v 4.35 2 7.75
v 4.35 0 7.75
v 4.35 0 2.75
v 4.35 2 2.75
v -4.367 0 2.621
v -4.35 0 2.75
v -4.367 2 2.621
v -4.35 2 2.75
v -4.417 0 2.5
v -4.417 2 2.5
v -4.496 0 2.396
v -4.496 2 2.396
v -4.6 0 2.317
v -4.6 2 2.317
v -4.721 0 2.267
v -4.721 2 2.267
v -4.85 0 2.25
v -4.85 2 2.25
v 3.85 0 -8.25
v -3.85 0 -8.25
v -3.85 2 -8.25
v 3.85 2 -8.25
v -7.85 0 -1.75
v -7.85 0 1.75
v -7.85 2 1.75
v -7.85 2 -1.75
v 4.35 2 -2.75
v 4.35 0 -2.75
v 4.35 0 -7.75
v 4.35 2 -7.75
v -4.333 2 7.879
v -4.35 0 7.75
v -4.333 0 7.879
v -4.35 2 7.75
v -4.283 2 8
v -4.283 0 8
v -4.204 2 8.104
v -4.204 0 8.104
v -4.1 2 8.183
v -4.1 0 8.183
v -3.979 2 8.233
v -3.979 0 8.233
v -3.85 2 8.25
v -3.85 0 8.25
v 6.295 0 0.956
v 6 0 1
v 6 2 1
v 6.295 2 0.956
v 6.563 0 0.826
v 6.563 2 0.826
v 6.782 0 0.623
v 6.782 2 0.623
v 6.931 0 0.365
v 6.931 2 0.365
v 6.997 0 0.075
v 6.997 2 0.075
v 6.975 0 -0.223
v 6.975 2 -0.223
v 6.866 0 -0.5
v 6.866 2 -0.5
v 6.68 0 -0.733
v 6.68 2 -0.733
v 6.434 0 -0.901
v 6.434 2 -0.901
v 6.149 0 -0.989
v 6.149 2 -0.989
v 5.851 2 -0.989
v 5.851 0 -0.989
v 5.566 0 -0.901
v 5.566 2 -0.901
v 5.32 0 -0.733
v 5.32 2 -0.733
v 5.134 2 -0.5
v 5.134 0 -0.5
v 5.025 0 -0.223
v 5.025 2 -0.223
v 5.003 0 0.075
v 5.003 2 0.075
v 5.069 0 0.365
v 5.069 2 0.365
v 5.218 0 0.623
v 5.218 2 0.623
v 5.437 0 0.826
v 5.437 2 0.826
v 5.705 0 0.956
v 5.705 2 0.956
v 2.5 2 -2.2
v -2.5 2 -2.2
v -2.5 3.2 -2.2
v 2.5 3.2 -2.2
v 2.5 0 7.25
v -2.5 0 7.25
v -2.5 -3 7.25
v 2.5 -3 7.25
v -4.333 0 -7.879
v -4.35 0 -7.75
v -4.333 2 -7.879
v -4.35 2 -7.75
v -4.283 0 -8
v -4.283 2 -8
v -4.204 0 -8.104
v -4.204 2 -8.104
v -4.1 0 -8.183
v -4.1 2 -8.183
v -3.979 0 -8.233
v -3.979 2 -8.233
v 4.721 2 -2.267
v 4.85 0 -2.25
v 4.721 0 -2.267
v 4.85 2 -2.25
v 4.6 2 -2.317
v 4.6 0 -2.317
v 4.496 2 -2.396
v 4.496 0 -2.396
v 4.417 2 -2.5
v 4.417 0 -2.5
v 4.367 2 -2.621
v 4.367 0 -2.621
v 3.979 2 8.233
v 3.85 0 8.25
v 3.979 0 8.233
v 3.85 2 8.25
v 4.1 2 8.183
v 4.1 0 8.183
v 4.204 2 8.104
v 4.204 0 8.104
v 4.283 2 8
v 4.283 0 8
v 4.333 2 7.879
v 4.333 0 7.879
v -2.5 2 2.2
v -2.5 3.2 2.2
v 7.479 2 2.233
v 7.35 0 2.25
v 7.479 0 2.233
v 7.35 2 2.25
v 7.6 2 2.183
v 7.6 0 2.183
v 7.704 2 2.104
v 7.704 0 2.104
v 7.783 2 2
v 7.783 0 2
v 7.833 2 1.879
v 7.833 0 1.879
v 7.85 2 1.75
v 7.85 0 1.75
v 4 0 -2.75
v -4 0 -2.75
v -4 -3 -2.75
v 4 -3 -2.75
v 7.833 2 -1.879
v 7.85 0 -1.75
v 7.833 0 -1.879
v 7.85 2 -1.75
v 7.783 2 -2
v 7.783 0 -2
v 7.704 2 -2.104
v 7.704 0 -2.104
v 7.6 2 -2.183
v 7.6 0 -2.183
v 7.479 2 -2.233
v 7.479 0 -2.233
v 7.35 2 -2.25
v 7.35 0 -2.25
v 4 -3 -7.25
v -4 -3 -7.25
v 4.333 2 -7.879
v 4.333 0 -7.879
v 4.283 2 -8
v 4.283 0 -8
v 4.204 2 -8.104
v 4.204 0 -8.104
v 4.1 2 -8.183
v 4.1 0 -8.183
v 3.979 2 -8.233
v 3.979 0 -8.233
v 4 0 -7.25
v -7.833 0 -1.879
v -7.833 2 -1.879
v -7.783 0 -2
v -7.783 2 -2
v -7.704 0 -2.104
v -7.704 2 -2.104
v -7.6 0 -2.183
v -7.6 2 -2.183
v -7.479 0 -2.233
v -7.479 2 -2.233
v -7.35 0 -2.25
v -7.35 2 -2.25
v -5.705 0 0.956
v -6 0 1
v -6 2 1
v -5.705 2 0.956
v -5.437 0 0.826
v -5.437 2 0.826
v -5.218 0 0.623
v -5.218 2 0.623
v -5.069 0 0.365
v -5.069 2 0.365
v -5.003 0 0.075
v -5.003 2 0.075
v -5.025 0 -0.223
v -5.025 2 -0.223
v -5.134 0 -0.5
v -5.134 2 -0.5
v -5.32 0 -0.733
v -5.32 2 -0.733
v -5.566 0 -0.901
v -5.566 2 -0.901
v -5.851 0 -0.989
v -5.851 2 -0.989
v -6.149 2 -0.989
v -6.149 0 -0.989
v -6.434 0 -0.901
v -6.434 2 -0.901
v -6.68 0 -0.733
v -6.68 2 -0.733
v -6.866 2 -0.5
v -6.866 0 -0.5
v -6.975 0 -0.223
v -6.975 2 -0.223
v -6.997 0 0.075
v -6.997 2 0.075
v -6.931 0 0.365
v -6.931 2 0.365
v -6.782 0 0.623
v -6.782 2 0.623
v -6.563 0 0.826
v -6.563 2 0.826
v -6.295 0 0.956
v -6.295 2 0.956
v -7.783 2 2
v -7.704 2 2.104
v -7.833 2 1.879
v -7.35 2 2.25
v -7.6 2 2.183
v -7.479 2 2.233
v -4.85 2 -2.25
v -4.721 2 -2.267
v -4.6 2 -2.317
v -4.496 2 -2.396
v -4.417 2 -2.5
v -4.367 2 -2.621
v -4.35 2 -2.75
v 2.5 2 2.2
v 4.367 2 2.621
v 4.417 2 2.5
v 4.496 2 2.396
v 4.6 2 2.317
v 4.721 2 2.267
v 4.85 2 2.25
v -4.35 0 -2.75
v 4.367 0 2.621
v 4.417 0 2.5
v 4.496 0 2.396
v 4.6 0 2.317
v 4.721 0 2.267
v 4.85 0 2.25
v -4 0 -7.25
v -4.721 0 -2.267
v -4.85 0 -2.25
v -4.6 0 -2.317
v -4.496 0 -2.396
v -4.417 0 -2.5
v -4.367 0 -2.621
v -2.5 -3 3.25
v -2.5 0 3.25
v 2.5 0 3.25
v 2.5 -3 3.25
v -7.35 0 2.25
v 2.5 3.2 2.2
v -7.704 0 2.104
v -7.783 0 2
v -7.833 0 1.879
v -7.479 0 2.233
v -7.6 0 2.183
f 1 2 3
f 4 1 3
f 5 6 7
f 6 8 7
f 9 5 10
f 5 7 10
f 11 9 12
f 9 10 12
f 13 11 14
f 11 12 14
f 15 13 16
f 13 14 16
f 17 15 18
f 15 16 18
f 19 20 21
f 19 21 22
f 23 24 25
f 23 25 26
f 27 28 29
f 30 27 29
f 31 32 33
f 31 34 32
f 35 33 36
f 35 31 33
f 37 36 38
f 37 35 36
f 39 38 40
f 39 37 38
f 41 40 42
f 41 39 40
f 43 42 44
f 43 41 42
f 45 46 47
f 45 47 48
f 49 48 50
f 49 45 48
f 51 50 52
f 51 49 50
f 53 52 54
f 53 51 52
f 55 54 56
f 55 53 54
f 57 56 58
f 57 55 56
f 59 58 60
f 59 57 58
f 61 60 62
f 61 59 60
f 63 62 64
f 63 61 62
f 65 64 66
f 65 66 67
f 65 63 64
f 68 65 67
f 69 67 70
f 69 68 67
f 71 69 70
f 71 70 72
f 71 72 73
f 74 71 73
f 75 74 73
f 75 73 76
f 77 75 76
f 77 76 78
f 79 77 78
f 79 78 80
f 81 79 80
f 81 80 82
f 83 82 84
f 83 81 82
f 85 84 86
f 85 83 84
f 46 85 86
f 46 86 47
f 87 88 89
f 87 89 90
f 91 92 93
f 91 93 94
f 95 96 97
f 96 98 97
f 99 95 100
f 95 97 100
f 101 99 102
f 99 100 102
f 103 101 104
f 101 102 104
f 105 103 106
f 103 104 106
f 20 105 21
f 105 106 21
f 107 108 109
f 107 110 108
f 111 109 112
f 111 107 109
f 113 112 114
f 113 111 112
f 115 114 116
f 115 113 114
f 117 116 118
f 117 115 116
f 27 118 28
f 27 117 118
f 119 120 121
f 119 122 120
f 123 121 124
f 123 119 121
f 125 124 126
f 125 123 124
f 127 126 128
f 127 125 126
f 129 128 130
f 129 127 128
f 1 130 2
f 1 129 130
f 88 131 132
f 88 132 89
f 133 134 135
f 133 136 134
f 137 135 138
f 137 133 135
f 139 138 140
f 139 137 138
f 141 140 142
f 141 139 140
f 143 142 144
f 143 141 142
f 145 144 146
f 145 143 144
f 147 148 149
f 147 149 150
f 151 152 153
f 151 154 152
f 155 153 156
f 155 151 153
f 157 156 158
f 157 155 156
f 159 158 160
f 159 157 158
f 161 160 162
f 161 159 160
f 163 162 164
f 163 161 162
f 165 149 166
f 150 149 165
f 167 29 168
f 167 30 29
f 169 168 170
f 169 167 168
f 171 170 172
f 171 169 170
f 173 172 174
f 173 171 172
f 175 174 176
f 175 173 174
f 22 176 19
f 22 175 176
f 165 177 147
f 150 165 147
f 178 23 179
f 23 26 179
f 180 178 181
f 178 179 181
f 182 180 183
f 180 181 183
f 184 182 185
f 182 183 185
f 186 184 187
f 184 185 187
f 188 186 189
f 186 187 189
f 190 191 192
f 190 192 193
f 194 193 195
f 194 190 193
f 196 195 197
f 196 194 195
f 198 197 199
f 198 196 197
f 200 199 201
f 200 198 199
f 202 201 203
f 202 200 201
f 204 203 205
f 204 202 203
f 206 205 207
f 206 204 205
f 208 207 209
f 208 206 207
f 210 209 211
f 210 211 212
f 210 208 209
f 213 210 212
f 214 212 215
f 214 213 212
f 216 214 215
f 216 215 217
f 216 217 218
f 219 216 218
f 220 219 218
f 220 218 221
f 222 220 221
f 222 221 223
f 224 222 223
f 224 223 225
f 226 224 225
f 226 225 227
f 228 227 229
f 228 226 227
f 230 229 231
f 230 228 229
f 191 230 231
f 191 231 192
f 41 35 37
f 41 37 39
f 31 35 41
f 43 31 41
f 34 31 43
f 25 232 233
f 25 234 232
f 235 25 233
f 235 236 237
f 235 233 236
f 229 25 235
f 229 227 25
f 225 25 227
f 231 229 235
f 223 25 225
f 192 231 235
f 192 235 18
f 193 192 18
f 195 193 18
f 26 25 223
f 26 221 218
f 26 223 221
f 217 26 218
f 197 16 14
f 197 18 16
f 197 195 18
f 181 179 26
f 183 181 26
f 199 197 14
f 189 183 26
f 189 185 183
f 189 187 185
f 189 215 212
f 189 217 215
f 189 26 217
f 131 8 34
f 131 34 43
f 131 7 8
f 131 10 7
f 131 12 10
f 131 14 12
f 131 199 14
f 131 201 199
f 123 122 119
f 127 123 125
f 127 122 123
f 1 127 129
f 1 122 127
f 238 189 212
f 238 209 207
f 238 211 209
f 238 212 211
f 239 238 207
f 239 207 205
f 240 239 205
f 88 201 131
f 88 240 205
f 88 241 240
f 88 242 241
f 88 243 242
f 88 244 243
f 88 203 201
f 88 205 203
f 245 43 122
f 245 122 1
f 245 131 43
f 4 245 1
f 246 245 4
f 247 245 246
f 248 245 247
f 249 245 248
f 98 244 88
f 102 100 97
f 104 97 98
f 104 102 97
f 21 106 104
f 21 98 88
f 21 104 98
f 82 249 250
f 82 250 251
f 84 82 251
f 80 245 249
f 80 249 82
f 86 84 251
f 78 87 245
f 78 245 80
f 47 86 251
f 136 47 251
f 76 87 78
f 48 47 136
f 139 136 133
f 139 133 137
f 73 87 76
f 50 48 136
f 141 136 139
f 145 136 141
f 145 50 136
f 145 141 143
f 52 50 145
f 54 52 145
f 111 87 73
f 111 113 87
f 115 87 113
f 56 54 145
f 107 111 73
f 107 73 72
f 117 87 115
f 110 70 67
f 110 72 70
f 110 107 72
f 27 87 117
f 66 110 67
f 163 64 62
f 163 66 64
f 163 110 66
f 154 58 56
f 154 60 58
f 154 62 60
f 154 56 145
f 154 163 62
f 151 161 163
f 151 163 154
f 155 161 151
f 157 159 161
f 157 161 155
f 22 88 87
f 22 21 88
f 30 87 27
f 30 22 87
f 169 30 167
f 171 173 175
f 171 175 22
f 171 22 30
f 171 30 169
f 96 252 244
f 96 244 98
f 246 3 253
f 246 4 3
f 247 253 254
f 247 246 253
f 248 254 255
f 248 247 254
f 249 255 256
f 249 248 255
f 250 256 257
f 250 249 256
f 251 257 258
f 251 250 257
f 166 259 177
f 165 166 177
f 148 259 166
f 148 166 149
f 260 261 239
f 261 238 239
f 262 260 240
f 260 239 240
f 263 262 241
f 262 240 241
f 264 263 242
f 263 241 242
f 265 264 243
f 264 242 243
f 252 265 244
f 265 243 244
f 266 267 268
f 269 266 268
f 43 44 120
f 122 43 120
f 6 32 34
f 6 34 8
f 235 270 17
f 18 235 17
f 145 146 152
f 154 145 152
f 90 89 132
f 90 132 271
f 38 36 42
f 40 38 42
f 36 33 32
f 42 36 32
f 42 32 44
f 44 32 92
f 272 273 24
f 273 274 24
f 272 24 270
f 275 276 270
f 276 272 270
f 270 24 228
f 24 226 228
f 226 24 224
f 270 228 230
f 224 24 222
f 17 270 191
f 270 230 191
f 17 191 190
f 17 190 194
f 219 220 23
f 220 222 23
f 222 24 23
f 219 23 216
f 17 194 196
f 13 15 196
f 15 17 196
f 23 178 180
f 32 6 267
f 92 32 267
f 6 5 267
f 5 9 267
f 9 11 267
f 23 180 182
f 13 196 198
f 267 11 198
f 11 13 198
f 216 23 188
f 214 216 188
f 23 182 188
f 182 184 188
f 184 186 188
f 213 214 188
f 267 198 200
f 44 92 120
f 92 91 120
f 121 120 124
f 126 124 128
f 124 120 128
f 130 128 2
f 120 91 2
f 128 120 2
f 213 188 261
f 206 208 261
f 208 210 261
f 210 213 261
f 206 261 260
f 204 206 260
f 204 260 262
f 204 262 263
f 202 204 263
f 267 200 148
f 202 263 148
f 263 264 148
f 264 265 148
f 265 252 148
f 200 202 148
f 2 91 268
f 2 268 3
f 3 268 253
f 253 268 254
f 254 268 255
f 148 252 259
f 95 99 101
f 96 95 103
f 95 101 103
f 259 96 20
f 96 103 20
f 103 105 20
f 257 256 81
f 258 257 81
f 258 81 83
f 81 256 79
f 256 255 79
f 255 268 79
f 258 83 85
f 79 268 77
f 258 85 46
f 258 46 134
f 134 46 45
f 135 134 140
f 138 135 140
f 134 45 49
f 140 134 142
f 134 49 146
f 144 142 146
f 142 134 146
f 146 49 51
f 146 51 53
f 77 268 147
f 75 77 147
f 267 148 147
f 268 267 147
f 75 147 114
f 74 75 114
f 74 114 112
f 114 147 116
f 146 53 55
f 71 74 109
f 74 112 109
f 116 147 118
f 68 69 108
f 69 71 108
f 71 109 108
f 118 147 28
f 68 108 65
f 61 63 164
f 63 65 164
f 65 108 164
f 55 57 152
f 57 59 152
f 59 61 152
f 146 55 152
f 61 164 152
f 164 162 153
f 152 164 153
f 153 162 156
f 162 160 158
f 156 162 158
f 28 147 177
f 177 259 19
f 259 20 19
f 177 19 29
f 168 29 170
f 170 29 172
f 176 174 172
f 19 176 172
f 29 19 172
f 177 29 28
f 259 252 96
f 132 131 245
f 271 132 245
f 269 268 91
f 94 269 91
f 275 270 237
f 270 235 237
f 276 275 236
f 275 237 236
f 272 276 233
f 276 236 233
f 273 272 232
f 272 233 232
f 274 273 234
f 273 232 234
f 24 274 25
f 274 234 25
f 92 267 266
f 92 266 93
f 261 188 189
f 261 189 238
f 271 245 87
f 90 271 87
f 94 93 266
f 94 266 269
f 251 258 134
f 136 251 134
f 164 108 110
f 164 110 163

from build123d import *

# Parameters (mm, degrees)
SKETCH1_W           = 8.7
SKETCH1_H           = 6
SKETCH1_H_2         = 4.5
SKETCH1_W_2         = 3.5
SKETCH1_R           = 1
BOSS_EXTRUDE1_DEPTH = 2
FILLET1_R           = 0.5
SKETCH2_W           = 8
SKETCH2_H           = 4.5
SKETCH2_W_2         = 5
SKETCH2_H_2         = 4
BOSS_EXTRUDE2_DEPTH = 3
SKETCH3_W           = 5
SKETCH3_H           = 4.4
BOSS_EXTRUDE3_DEPTH = 1.2


with BuildPart() as part:
    # Sketch1 → Boss-Extrude1 (new body)
    # profile 1 of 5: a face of its own
    with BuildSketch(Plane(origin=(0, 0, 0), x_dir=(1, 0, 0), z_dir=(0, 1, 0))):
        with Locations((0, 5.25)):
            Rectangle(SKETCH1_W, SKETCH1_H)
    # profile 2 of 5: a face of its own
    with BuildSketch(Plane(origin=(0, 0, 0), x_dir=(1, 0, 0), z_dir=(0, 1, 0))):
        Rectangle(SKETCH1_W, SKETCH1_H_2)
    # profile 3 of 5: a face of its own
    with BuildSketch(Plane(origin=(0, 0, 0), x_dir=(1, 0, 0), z_dir=(0, 1, 0))):
        with Locations((-6.1, 0)):
            Rectangle(SKETCH1_W_2, SKETCH1_H_2)
        with Locations(Location((-6, 0, 0), (0, 0, 270))):
            Circle(SKETCH1_R, mode=Mode.SUBTRACT)
    # profile 4 of 5: a face of its own
    with BuildSketch(Plane(origin=(0, 0, 0), x_dir=(1, 0, 0), z_dir=(0, 1, 0))):
        with Locations((6.1, 0)):
            Rectangle(SKETCH1_W_2, SKETCH1_H_2)
        with Locations(Location((6, 0, 0), (0, 0, 270))):
            Circle(SKETCH1_R, mode=Mode.SUBTRACT)
    # profile 5 of 5: a face of its own
    with BuildSketch(Plane(origin=(0, 0, 0), x_dir=(1, 0, 0), z_dir=(0, 1, 0))):
        with Locations((0, -5.25)):
            Rectangle(SKETCH1_W, SKETCH1_H)
    extrude(amount=BOSS_EXTRUDE1_DEPTH)

    # Fillet1
    fillet1_edges = [part.edges().sort_by_distance(p)[0] for p in [
        (-4.35, 1, -8.25),
        (4.35, 1, -8.25),
        (4.35, 1, -2.25),
        (7.85, 1, -2.25),
        (7.85, 1, 2.25),
        (4.35, 1, 2.25),
        (4.35, 1, 8.25),
        (-4.35, 1, 8.25),
        (-4.35, 1, 2.25),
        (-7.85, 1, 2.25),
        (-7.85, 1, -2.25),
        (-4.35, 1, -2.25),
    ]]
    fillet(fillet1_edges, radius=FILLET1_R)

    # Sketch2 → Boss-Extrude2 (add)
    with BuildSketch(Plane.XZ):
        with Locations((0, -5)):
            Rectangle(SKETCH2_W, SKETCH2_H)
        with Locations((0, 5.25)):
            Rectangle(SKETCH2_W_2, SKETCH2_H_2)
    extrude(amount=BOSS_EXTRUDE2_DEPTH)

    # Sketch3 → Boss-Extrude3 (add)
    with BuildSketch(Plane(origin=(0, 2, 0), x_dir=(1, 0, 0), z_dir=(0, 1, 0))):
        Rectangle(SKETCH3_W, SKETCH3_H)
    extrude(amount=BOSS_EXTRUDE3_DEPTH)


solid = part.part
